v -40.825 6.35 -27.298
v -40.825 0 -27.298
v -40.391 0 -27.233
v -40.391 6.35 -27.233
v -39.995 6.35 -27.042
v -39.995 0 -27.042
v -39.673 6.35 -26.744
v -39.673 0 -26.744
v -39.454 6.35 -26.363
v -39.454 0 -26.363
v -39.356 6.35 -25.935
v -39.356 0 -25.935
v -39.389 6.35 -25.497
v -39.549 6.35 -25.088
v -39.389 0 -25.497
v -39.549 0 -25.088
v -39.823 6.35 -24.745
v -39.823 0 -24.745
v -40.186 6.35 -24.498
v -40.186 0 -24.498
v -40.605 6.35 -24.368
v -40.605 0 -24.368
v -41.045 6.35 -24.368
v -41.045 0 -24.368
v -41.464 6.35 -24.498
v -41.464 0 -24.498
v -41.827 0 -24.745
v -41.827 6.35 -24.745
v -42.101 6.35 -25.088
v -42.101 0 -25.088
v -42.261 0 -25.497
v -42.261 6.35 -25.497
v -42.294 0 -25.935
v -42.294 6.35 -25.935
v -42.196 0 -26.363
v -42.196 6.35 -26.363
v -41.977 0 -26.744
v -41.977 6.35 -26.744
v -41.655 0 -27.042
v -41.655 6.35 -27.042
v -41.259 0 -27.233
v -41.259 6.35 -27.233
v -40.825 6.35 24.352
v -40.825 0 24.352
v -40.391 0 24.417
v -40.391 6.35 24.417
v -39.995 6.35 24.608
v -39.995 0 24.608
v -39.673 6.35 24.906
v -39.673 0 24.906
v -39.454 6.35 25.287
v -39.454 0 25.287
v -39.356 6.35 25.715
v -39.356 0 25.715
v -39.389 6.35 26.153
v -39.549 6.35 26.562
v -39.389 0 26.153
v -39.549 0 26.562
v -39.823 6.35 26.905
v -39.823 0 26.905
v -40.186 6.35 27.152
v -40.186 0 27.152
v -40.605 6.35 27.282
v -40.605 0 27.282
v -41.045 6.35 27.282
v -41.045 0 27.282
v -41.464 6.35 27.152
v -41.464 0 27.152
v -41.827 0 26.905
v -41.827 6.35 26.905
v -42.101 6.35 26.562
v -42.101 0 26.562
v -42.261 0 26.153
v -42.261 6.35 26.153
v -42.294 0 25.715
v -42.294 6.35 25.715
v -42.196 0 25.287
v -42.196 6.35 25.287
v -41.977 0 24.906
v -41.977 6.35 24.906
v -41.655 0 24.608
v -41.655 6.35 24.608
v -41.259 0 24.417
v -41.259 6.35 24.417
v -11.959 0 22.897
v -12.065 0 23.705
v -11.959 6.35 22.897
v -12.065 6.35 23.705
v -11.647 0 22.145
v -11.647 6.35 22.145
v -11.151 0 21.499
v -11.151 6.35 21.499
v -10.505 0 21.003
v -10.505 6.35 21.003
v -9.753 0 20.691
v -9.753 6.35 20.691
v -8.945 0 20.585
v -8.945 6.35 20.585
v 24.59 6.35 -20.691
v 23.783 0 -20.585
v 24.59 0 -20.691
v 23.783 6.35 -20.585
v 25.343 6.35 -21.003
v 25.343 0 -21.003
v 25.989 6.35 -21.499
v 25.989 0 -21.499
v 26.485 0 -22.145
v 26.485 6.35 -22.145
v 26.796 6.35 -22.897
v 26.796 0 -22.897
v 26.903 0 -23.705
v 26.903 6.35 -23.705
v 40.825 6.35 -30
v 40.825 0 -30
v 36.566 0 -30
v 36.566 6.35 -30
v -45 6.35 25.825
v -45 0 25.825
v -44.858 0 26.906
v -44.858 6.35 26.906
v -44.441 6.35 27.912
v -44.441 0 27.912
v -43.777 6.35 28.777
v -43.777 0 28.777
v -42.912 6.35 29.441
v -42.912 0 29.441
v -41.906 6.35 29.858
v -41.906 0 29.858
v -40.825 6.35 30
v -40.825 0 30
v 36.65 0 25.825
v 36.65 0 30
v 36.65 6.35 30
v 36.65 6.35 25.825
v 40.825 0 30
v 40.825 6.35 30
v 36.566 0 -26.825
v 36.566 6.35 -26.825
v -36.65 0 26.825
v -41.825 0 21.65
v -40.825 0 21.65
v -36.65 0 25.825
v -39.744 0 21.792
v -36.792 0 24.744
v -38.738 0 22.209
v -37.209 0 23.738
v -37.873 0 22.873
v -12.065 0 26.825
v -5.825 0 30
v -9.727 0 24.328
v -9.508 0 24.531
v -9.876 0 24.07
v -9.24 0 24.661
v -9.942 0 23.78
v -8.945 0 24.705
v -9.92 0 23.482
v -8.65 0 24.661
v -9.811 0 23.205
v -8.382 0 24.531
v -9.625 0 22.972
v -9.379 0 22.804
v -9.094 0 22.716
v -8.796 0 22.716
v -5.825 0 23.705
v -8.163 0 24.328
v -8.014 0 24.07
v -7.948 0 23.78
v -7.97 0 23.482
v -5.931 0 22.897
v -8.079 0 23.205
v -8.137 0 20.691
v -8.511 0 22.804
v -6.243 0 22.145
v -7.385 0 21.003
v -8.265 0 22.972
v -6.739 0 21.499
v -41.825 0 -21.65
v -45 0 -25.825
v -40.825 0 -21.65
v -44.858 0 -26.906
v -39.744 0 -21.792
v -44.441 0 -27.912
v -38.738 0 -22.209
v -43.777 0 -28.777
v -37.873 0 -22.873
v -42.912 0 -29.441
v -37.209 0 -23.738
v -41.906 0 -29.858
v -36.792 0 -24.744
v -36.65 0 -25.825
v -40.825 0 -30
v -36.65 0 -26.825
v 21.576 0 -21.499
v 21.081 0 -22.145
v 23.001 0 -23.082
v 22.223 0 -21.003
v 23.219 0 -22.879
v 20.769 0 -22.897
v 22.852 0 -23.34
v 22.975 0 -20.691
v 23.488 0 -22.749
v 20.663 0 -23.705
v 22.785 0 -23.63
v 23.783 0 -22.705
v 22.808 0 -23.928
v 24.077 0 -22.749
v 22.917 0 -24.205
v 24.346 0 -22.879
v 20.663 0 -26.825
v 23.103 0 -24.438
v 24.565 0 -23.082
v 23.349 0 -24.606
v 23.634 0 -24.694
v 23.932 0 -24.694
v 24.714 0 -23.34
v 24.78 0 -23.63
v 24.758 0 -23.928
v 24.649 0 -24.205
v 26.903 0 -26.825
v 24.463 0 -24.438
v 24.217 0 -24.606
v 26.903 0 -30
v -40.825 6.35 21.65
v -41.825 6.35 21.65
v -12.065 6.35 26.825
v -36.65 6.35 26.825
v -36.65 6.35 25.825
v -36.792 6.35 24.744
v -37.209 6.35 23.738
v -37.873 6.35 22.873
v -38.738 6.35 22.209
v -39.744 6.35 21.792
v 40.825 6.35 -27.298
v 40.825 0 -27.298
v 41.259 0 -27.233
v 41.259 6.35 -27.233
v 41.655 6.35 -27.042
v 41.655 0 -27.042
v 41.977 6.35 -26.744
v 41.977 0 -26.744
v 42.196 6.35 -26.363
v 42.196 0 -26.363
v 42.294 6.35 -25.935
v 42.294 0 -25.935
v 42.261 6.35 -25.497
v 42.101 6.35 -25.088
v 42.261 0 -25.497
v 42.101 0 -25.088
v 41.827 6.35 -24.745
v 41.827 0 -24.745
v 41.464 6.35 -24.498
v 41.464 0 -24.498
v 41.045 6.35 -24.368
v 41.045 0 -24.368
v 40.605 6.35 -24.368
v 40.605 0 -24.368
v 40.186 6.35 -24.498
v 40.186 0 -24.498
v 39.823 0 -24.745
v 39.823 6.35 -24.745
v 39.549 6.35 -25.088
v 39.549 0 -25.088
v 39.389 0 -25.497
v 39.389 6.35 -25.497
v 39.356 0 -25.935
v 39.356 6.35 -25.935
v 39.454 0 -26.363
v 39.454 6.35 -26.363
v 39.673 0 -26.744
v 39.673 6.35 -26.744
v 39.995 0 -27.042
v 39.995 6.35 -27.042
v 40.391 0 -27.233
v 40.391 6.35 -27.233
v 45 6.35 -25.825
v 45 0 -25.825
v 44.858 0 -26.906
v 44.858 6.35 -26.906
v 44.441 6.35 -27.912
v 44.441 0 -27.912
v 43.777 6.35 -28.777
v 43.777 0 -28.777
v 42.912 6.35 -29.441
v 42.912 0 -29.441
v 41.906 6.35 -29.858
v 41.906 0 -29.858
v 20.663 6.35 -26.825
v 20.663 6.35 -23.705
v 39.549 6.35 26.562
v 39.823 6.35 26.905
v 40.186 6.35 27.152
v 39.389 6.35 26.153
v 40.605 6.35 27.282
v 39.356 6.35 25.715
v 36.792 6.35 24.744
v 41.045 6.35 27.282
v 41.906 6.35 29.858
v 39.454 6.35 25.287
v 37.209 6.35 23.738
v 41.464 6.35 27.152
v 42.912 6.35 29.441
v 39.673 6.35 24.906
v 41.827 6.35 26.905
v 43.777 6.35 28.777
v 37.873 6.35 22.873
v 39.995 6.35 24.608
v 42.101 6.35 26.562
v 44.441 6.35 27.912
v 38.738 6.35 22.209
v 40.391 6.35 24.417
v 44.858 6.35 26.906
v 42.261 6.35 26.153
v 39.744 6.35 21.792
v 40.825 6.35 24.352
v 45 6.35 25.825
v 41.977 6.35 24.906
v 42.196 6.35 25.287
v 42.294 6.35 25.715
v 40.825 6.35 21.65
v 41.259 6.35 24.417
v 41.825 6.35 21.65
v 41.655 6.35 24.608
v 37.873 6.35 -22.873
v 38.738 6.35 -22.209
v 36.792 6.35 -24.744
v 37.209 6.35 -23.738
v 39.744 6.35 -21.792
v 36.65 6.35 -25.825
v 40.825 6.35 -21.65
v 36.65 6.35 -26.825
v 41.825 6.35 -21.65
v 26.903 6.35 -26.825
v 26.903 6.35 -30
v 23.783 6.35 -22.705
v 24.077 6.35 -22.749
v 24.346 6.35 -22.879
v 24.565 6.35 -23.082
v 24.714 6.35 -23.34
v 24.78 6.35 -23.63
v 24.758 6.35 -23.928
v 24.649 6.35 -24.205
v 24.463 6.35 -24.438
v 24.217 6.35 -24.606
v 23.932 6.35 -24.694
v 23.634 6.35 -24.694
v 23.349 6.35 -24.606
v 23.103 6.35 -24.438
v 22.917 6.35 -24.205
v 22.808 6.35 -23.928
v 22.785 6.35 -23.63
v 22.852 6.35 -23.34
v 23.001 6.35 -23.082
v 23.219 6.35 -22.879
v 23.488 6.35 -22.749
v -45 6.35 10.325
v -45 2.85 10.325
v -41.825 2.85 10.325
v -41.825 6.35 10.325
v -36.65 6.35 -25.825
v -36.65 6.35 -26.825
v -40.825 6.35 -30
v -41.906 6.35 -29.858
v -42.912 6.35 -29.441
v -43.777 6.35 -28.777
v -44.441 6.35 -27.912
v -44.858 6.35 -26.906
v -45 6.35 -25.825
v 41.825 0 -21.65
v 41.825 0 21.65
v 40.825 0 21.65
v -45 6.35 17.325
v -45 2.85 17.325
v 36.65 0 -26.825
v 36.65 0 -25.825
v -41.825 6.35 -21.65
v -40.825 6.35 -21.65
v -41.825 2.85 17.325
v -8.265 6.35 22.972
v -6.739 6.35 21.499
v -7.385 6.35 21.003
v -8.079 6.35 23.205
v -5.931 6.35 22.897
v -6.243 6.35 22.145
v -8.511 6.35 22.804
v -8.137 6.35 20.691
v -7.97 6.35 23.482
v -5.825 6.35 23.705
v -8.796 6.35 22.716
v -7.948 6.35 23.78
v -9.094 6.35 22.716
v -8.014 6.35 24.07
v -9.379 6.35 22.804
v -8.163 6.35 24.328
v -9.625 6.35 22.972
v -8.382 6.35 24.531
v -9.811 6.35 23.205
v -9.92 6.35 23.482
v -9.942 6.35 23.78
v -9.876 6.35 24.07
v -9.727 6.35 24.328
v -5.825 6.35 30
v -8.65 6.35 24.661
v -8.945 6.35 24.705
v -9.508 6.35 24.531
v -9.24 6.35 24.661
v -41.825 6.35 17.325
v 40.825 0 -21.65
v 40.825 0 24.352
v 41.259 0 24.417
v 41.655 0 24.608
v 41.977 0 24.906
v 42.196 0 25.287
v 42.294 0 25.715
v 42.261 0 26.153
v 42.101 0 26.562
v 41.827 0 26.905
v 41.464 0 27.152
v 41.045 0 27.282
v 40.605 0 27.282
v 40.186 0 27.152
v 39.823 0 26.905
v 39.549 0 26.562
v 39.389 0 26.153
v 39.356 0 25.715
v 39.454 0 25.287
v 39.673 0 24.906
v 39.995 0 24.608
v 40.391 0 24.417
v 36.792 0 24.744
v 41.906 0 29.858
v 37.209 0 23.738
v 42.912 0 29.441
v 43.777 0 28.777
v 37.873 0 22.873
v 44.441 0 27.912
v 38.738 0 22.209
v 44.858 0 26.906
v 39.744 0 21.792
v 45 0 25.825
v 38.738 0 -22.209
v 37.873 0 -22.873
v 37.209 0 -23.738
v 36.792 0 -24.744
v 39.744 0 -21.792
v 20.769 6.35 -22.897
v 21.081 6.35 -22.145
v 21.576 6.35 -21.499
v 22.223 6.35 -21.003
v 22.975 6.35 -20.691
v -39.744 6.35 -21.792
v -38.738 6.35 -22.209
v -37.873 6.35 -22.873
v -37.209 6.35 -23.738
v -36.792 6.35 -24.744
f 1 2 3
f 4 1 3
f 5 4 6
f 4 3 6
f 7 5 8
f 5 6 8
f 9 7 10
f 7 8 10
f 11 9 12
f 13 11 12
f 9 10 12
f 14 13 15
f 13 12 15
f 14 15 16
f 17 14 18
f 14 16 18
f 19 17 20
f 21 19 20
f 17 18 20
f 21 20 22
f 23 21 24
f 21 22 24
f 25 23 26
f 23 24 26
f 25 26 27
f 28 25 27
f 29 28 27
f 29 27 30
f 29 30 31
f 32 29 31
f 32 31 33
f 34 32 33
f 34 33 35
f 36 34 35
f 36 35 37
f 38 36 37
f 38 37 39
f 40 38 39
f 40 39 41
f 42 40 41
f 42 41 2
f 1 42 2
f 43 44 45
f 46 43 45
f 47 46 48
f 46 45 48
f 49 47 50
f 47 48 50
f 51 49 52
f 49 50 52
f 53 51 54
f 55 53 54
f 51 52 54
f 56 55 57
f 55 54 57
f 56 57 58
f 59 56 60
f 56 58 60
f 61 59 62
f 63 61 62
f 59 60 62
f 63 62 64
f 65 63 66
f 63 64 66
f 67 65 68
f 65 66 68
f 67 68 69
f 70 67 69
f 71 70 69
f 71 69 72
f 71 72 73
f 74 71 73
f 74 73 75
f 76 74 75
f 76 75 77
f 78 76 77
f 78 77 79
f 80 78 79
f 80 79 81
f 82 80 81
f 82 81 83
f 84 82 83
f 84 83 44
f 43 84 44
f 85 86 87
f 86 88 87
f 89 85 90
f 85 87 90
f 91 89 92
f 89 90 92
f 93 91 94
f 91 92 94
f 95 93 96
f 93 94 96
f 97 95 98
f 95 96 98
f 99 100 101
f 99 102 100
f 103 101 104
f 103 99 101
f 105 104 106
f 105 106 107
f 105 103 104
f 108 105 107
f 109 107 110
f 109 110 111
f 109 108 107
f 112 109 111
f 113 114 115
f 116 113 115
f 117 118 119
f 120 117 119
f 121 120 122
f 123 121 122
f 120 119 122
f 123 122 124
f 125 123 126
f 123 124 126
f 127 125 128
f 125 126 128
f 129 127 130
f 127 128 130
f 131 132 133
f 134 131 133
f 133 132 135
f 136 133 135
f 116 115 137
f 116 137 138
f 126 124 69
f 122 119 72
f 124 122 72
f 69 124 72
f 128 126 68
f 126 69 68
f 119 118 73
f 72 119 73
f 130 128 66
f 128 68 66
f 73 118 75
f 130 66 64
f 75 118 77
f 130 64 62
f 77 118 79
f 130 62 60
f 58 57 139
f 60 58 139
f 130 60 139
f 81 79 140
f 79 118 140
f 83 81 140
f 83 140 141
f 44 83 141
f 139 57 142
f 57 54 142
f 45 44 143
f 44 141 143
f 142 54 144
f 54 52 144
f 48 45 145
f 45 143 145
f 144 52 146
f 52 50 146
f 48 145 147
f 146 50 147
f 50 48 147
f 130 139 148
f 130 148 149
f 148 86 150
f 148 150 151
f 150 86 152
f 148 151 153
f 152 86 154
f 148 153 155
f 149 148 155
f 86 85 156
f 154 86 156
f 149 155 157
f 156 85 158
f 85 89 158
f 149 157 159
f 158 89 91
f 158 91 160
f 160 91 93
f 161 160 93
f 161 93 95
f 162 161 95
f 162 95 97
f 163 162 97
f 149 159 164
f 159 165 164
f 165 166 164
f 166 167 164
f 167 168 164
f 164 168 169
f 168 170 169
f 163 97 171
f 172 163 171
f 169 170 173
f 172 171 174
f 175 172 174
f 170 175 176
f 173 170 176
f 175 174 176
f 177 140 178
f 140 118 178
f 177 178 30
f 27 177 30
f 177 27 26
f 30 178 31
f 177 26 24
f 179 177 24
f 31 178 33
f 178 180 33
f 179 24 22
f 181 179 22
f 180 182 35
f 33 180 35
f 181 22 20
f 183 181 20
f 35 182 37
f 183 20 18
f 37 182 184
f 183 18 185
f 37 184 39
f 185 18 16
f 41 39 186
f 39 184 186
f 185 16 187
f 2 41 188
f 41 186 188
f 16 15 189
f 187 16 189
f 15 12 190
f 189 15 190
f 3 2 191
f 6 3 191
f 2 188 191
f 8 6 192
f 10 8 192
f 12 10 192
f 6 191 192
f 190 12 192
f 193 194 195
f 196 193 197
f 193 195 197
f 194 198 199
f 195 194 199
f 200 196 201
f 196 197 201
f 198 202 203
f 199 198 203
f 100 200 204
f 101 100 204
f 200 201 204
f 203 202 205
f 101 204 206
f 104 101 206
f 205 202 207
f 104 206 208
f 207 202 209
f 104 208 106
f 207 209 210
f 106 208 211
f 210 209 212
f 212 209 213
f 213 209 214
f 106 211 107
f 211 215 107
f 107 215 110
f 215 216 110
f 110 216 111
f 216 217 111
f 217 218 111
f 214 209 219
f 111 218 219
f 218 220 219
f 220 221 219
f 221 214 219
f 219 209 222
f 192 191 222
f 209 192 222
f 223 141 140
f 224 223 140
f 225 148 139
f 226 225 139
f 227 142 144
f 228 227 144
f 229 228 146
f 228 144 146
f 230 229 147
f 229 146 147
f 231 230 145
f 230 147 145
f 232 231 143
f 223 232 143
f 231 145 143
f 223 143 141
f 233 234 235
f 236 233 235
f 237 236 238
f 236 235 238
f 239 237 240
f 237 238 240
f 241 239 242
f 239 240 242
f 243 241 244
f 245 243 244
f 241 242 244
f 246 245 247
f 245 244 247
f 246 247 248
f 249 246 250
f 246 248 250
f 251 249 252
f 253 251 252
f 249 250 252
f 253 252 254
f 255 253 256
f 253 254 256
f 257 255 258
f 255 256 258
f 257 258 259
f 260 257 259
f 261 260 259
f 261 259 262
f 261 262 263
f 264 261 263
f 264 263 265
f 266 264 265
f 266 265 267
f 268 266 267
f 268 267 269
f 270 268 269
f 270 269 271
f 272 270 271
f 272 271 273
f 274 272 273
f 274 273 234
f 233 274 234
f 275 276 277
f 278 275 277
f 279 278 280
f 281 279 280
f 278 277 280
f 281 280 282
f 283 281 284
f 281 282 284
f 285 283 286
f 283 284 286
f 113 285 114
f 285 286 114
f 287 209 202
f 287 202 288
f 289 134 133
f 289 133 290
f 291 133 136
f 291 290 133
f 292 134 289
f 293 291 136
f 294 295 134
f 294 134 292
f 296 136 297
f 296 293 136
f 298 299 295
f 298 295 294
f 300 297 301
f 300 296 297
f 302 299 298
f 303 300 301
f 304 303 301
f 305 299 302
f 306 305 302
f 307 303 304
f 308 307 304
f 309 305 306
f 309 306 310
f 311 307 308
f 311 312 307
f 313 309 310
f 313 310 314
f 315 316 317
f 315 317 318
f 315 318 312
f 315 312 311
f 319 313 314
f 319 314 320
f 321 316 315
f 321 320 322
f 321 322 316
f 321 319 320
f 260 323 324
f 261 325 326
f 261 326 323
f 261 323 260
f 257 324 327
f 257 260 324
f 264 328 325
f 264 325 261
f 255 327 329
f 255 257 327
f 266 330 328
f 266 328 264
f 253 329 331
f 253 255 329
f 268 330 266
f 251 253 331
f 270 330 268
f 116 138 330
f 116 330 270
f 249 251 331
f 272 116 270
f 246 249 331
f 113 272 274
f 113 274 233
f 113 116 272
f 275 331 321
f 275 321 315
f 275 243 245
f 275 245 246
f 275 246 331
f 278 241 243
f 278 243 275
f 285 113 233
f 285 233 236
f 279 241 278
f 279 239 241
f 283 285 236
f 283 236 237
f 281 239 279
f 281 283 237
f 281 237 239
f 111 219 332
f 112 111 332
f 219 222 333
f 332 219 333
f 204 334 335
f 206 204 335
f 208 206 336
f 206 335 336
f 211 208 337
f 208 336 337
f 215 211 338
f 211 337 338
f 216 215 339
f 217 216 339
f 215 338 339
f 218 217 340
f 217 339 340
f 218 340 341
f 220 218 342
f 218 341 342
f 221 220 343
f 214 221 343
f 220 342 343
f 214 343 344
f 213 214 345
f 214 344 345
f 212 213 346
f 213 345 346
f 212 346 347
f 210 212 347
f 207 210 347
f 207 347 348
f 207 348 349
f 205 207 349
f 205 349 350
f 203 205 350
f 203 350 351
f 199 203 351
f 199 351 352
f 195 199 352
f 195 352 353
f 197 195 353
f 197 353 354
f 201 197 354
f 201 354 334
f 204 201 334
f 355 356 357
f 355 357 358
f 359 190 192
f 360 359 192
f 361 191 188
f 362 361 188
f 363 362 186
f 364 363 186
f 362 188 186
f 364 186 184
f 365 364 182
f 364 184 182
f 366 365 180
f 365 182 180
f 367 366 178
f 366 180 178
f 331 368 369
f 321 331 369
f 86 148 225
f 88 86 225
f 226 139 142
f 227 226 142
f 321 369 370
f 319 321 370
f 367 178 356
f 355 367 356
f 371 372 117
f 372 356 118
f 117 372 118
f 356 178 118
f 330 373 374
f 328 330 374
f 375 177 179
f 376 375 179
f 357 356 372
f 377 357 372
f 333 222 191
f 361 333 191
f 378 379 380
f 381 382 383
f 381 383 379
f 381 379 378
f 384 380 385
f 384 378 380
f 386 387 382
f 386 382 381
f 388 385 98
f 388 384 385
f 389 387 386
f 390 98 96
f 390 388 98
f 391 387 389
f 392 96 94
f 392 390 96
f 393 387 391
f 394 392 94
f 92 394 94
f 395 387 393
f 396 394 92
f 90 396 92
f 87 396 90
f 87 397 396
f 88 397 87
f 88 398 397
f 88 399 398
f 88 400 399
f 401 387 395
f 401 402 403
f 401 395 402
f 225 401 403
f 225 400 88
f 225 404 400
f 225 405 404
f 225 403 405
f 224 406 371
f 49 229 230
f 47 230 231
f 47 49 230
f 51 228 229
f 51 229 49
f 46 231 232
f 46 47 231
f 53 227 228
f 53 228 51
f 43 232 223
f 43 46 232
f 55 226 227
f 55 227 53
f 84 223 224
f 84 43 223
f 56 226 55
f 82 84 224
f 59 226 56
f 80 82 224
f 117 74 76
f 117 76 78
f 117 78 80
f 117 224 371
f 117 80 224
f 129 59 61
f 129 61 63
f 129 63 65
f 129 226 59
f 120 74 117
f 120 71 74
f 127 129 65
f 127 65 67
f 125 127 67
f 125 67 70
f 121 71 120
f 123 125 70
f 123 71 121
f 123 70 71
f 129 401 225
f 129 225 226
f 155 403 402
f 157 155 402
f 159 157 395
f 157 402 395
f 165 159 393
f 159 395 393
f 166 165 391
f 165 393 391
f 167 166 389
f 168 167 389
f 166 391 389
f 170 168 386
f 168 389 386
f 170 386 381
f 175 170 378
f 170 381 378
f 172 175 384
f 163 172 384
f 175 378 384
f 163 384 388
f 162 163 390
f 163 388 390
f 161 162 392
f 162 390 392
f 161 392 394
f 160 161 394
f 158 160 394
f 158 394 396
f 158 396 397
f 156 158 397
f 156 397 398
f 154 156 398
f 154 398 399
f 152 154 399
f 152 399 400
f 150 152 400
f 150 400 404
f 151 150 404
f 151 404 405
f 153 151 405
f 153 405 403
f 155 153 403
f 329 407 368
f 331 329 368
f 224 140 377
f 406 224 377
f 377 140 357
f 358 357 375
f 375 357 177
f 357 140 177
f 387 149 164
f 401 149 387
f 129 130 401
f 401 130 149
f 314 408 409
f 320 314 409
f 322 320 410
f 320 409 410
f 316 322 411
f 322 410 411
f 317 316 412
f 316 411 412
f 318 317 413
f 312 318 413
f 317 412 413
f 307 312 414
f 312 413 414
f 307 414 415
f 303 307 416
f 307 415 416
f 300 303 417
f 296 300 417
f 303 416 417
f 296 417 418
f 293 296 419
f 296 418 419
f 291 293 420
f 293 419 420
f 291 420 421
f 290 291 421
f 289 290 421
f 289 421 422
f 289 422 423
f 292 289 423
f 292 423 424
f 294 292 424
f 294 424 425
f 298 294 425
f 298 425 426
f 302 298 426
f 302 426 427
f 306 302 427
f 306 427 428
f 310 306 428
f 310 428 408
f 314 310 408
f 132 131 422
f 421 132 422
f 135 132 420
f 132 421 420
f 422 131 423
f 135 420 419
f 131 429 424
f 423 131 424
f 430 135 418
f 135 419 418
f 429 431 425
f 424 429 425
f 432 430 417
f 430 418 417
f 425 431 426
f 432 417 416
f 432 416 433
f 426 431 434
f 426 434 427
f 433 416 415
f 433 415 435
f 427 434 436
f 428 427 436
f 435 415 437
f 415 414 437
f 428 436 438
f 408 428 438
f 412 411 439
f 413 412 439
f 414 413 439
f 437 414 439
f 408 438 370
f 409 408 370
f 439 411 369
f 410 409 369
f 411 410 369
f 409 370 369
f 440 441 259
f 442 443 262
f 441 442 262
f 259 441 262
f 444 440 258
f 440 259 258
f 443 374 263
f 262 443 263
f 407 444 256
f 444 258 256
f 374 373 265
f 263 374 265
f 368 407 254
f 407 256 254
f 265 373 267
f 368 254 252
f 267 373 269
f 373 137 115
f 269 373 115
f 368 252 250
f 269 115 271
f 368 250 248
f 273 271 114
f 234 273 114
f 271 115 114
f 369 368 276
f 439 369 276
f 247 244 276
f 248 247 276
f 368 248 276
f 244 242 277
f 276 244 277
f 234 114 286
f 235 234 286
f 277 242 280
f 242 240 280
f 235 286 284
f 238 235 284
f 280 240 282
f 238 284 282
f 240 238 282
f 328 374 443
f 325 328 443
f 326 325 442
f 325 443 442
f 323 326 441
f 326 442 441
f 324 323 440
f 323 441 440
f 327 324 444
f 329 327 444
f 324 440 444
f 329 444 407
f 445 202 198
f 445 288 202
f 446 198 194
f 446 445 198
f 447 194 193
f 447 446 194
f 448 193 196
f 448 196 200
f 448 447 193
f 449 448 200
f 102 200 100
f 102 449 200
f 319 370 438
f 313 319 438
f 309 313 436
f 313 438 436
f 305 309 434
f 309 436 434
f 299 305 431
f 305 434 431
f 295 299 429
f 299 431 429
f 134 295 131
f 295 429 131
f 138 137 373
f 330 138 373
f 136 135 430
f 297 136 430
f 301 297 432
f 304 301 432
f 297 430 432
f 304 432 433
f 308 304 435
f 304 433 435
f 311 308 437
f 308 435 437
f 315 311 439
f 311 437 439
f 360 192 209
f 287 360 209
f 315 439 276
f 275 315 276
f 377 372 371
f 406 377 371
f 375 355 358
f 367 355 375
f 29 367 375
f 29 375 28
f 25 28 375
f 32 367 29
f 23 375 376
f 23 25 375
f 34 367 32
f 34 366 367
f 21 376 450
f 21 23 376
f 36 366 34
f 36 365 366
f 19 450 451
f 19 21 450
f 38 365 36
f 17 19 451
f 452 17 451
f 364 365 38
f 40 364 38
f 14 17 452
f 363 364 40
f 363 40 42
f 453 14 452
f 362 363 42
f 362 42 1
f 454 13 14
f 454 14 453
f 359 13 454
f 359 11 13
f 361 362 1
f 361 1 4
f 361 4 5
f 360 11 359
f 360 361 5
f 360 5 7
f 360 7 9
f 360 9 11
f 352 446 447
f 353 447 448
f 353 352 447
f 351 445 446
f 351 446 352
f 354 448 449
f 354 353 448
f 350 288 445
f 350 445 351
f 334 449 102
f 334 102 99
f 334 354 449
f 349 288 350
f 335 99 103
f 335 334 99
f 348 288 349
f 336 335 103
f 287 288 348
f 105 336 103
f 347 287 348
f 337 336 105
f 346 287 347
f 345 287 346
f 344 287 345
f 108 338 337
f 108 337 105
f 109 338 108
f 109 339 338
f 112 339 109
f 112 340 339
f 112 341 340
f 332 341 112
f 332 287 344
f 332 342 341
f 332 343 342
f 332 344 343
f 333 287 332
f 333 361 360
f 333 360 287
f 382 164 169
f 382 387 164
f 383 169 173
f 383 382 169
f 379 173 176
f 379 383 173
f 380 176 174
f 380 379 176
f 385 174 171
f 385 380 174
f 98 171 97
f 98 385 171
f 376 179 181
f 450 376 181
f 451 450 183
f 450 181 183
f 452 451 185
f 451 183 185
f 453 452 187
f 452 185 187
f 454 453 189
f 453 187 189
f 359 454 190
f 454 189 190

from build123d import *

# Parameters (mm, degrees)
BOSS_EXTRUDE3_DEPTH = 6.35
SKETCH3_W           = 9.663283239
SKETCH3_H           = 6.35
CUT_EXTRUDE1_DEPTH  = 3.175
SKETCH4_W           = 42.475
SKETCH4_H           = 6.35
CUT_EXTRUDE2_DEPTH  = 8.35
SKETCH5_W           = 7
SKETCH5_H           = 7
CUT_EXTRUDE3_DEPTH  = 3.175
SKETCH7_R           = 1.4732
CUT_EXTRUDE4_DEPTH  = 10
SKETCH10_W          = 6.24
SKETCH10_H          = 6.35
BOSS_EXTRUDE4_DEPTH = 6.24
SKETCH11_W          = 6.24
SKETCH11_H          = 6.35
BOSS_EXTRUDE5_DEPTH = 6.24
SKETCH12_R          = 1
CUT_EXTRUDE5_DEPTH  = 55.454774814
SKETCH13_R          = 1
CUT_EXTRUDE6_DEPTH  = 55.454774814
FILLET1_R           = 3.12


with BuildPart() as part:
    # Sketch2 → Boss-Extrude3 (new body)
    with BuildSketch(Plane(origin=(0, 0, 0), x_dir=(1, 0, 0), z_dir=(0, 1, 0))):
        with BuildLine():
            Line((-45, 25.825), (-45, -25.825))
            ThreePointArc((-45, -25.825), (-43.777170811, -28.777170811), (-40.825, -30))
            Line((-40.825, -30), (40.825, -30))
            ThreePointArc((40.825, -30), (43.777170811, -28.777170811), (45, -25.825))
            Line((45, -25.825), (45, 25.825))
            ThreePointArc((45, 25.825), (43.777170811, 28.777170811), (40.825, 30))
            Line((40.825, 30), (-40.825, 30))
            ThreePointArc((-40.825, 30), (-43.777170811, 28.777170811), (-45, 25.825))
        make_face()
        with BuildLine():
            Line((40.825, 21.65), (41.825, 21.65))
            Line((41.825, 21.65), (41.825, -21.65))
            Line((41.825, -21.65), (40.825, -21.65))
            ThreePointArc((40.825, -21.65), (37.872829189, -22.872829189), (36.65, -25.825))
            Line((36.65, -25.825), (36.65, -26.825))
            Line((36.65, -26.825), (-36.65, -26.825))
            Line((-36.65, -26.825), (-36.65, -25.825))
            ThreePointArc((-36.65, -25.825), (-37.872829189, -22.872829189), (-40.825, -21.65))
            Line((-40.825, -21.65), (-41.825, -21.65))
            Line((-41.825, -21.65), (-41.825, 21.65))
            Line((-41.825, 21.65), (-40.825, 21.65))
            ThreePointArc((-40.825, 21.65), (-37.872829189, 22.872829189), (-36.65, 25.825))
            Line((-36.65, 25.825), (-36.65, 26.825))
            Line((-36.65, 26.825), (36.65, 26.825))
            Line((36.65, 26.825), (36.65, 25.825))
            ThreePointArc((36.65, 25.825), (37.872829189, 22.872829189), (40.825, 21.65))
        make_face(mode=Mode.SUBTRACT)
    extrude(amount=BOSS_EXTRUDE3_DEPTH)

    # Sketch3 → Cut-Extrude1 (cut)
    with BuildSketch(Plane(origin=(0, 0, -30), x_dir=(-1, 0, 0), z_dir=(0, 0, -1))):
        with Locations((-31.734329903, 3.175)):
            Rectangle(SKETCH3_W, SKETCH3_H)
    extrude(amount=-CUT_EXTRUDE1_DEPTH, mode=Mode.SUBTRACT)

    # Sketch4 → Cut-Extrude2 (cut)
    with BuildSketch(Plane.XY.offset(30)):
        with Locations((15.4125, 3.175)):
            Rectangle(SKETCH4_W, SKETCH4_H)
    extrude(amount=-CUT_EXTRUDE2_DEPTH, mode=Mode.SUBTRACT)


with BuildPart() as cut_extrude2_piece_1:
    # of the separate pieces the step leaves, piece 1, a body of its own (cut_extrude2_pieces)
    add(part.part.solids().sort_by_distance((-40.825, 0, 30))[0])

    # Sketch5 → Cut-Extrude3 (cut)
    with BuildSketch(Plane.ZY.offset(45)):
        with Locations((13.825, 6.35)):
            Rectangle(SKETCH5_W, SKETCH5_H)
    extrude(amount=-CUT_EXTRUDE3_DEPTH, mode=Mode.SUBTRACT)


with BuildPart() as cut_extrude2_piece_2:
    # of the separate pieces the step leaves, piece 2, a body of its own (cut_extrude2_pieces)
    add(part.part.solids().sort_by_distance((40.825, 0, -30))[0])


with BuildPart() as cut_extrude4_tool:
    # Sketch7 → Cut-Extrude4 (new body)
    with BuildSketch(Plane.XZ):
        with Locations(Location((-40.825, -25.825, 0), (0, 0, 270))):
            Circle(SKETCH7_R)
        with Locations(Location((-40.825, 25.825, 0), (0, 0, 270))):
            Circle(SKETCH7_R)
        with Locations(Location((40.825, 25.825, 0), (0, 0, 270))):
            Circle(SKETCH7_R)
        with Locations(Location((40.825, -25.825, 0), (0, 0, 270))):
            Circle(SKETCH7_R)
    extrude(amount=-CUT_EXTRUDE4_DEPTH)


with BuildPart() as cut_extrude2_piece_1_1:
    add(cut_extrude2_piece_1.part)

    # Cut-Extrude4: cut by cut_extrude4_tool
    add(cut_extrude4_tool.part, mode=Mode.SUBTRACT)

    # Sketch10 → Boss-Extrude4 (add)
    with BuildSketch(Plane(origin=(0, 0, 26.825), x_dir=(-1, 0, 0), z_dir=(0, 0, -1))):
        with Locations((8.945, 3.175)):
            Rectangle(SKETCH10_W, SKETCH10_H)
    extrude(amount=BOSS_EXTRUDE4_DEPTH)

    # Sketch11 → Boss-Extrude5 (add)
    with BuildSketch(Plane.XY.offset(-26.825)):
        with Locations((23.782688283, 3.175)):
            Rectangle(SKETCH11_W, SKETCH11_H)
    extrude(amount=BOSS_EXTRUDE5_DEPTH)

    # Sketch12 → Cut-Extrude5 (cut, through all)
    with BuildSketch(Plane(origin=(0, 6.35, 0), x_dir=(1, 0, 0), z_dir=(0, 1, 0))):
        with Locations(Location((23.782688283, 23.705, 0), (0, 0, 270))):
            Circle(SKETCH12_R)
    extrude(amount=-CUT_EXTRUDE5_DEPTH, mode=Mode.SUBTRACT)

    # Sketch13 → Cut-Extrude6 (cut, through all)
    with BuildSketch(Plane(origin=(0, 6.35, 0), x_dir=(1, 0, 0), z_dir=(0, 1, 0))):
        with Locations(Location((-8.945, -23.705, 0), (0, 0, 270))):
            Circle(SKETCH13_R)
    extrude(amount=-CUT_EXTRUDE6_DEPTH, mode=Mode.SUBTRACT)

    # Fillet1
    fillet1_edges = [cut_extrude2_piece_1_1.edges().sort_by_distance(p)[0] for p in [
        (26.902688283, 3.175, -20.585),
        (20.662688283, 3.175, -20.585),
        (-5.825, 3.175, 20.585),
        (-12.065, 3.175, 20.585),
    ]]
    fillet(fillet1_edges, radius=FILLET1_R - 0.0001)  # a hair under: the kernel refuses the full size


with BuildPart() as cut_extrude2_piece_2_1:
    add(cut_extrude2_piece_2.part)

    # Cut-Extrude4: cut by cut_extrude4_tool
    add(cut_extrude4_tool.part, mode=Mode.SUBTRACT)


solid = Compound([cut_extrude2_piece_1_1.part, cut_extrude2_piece_2_1.part])
